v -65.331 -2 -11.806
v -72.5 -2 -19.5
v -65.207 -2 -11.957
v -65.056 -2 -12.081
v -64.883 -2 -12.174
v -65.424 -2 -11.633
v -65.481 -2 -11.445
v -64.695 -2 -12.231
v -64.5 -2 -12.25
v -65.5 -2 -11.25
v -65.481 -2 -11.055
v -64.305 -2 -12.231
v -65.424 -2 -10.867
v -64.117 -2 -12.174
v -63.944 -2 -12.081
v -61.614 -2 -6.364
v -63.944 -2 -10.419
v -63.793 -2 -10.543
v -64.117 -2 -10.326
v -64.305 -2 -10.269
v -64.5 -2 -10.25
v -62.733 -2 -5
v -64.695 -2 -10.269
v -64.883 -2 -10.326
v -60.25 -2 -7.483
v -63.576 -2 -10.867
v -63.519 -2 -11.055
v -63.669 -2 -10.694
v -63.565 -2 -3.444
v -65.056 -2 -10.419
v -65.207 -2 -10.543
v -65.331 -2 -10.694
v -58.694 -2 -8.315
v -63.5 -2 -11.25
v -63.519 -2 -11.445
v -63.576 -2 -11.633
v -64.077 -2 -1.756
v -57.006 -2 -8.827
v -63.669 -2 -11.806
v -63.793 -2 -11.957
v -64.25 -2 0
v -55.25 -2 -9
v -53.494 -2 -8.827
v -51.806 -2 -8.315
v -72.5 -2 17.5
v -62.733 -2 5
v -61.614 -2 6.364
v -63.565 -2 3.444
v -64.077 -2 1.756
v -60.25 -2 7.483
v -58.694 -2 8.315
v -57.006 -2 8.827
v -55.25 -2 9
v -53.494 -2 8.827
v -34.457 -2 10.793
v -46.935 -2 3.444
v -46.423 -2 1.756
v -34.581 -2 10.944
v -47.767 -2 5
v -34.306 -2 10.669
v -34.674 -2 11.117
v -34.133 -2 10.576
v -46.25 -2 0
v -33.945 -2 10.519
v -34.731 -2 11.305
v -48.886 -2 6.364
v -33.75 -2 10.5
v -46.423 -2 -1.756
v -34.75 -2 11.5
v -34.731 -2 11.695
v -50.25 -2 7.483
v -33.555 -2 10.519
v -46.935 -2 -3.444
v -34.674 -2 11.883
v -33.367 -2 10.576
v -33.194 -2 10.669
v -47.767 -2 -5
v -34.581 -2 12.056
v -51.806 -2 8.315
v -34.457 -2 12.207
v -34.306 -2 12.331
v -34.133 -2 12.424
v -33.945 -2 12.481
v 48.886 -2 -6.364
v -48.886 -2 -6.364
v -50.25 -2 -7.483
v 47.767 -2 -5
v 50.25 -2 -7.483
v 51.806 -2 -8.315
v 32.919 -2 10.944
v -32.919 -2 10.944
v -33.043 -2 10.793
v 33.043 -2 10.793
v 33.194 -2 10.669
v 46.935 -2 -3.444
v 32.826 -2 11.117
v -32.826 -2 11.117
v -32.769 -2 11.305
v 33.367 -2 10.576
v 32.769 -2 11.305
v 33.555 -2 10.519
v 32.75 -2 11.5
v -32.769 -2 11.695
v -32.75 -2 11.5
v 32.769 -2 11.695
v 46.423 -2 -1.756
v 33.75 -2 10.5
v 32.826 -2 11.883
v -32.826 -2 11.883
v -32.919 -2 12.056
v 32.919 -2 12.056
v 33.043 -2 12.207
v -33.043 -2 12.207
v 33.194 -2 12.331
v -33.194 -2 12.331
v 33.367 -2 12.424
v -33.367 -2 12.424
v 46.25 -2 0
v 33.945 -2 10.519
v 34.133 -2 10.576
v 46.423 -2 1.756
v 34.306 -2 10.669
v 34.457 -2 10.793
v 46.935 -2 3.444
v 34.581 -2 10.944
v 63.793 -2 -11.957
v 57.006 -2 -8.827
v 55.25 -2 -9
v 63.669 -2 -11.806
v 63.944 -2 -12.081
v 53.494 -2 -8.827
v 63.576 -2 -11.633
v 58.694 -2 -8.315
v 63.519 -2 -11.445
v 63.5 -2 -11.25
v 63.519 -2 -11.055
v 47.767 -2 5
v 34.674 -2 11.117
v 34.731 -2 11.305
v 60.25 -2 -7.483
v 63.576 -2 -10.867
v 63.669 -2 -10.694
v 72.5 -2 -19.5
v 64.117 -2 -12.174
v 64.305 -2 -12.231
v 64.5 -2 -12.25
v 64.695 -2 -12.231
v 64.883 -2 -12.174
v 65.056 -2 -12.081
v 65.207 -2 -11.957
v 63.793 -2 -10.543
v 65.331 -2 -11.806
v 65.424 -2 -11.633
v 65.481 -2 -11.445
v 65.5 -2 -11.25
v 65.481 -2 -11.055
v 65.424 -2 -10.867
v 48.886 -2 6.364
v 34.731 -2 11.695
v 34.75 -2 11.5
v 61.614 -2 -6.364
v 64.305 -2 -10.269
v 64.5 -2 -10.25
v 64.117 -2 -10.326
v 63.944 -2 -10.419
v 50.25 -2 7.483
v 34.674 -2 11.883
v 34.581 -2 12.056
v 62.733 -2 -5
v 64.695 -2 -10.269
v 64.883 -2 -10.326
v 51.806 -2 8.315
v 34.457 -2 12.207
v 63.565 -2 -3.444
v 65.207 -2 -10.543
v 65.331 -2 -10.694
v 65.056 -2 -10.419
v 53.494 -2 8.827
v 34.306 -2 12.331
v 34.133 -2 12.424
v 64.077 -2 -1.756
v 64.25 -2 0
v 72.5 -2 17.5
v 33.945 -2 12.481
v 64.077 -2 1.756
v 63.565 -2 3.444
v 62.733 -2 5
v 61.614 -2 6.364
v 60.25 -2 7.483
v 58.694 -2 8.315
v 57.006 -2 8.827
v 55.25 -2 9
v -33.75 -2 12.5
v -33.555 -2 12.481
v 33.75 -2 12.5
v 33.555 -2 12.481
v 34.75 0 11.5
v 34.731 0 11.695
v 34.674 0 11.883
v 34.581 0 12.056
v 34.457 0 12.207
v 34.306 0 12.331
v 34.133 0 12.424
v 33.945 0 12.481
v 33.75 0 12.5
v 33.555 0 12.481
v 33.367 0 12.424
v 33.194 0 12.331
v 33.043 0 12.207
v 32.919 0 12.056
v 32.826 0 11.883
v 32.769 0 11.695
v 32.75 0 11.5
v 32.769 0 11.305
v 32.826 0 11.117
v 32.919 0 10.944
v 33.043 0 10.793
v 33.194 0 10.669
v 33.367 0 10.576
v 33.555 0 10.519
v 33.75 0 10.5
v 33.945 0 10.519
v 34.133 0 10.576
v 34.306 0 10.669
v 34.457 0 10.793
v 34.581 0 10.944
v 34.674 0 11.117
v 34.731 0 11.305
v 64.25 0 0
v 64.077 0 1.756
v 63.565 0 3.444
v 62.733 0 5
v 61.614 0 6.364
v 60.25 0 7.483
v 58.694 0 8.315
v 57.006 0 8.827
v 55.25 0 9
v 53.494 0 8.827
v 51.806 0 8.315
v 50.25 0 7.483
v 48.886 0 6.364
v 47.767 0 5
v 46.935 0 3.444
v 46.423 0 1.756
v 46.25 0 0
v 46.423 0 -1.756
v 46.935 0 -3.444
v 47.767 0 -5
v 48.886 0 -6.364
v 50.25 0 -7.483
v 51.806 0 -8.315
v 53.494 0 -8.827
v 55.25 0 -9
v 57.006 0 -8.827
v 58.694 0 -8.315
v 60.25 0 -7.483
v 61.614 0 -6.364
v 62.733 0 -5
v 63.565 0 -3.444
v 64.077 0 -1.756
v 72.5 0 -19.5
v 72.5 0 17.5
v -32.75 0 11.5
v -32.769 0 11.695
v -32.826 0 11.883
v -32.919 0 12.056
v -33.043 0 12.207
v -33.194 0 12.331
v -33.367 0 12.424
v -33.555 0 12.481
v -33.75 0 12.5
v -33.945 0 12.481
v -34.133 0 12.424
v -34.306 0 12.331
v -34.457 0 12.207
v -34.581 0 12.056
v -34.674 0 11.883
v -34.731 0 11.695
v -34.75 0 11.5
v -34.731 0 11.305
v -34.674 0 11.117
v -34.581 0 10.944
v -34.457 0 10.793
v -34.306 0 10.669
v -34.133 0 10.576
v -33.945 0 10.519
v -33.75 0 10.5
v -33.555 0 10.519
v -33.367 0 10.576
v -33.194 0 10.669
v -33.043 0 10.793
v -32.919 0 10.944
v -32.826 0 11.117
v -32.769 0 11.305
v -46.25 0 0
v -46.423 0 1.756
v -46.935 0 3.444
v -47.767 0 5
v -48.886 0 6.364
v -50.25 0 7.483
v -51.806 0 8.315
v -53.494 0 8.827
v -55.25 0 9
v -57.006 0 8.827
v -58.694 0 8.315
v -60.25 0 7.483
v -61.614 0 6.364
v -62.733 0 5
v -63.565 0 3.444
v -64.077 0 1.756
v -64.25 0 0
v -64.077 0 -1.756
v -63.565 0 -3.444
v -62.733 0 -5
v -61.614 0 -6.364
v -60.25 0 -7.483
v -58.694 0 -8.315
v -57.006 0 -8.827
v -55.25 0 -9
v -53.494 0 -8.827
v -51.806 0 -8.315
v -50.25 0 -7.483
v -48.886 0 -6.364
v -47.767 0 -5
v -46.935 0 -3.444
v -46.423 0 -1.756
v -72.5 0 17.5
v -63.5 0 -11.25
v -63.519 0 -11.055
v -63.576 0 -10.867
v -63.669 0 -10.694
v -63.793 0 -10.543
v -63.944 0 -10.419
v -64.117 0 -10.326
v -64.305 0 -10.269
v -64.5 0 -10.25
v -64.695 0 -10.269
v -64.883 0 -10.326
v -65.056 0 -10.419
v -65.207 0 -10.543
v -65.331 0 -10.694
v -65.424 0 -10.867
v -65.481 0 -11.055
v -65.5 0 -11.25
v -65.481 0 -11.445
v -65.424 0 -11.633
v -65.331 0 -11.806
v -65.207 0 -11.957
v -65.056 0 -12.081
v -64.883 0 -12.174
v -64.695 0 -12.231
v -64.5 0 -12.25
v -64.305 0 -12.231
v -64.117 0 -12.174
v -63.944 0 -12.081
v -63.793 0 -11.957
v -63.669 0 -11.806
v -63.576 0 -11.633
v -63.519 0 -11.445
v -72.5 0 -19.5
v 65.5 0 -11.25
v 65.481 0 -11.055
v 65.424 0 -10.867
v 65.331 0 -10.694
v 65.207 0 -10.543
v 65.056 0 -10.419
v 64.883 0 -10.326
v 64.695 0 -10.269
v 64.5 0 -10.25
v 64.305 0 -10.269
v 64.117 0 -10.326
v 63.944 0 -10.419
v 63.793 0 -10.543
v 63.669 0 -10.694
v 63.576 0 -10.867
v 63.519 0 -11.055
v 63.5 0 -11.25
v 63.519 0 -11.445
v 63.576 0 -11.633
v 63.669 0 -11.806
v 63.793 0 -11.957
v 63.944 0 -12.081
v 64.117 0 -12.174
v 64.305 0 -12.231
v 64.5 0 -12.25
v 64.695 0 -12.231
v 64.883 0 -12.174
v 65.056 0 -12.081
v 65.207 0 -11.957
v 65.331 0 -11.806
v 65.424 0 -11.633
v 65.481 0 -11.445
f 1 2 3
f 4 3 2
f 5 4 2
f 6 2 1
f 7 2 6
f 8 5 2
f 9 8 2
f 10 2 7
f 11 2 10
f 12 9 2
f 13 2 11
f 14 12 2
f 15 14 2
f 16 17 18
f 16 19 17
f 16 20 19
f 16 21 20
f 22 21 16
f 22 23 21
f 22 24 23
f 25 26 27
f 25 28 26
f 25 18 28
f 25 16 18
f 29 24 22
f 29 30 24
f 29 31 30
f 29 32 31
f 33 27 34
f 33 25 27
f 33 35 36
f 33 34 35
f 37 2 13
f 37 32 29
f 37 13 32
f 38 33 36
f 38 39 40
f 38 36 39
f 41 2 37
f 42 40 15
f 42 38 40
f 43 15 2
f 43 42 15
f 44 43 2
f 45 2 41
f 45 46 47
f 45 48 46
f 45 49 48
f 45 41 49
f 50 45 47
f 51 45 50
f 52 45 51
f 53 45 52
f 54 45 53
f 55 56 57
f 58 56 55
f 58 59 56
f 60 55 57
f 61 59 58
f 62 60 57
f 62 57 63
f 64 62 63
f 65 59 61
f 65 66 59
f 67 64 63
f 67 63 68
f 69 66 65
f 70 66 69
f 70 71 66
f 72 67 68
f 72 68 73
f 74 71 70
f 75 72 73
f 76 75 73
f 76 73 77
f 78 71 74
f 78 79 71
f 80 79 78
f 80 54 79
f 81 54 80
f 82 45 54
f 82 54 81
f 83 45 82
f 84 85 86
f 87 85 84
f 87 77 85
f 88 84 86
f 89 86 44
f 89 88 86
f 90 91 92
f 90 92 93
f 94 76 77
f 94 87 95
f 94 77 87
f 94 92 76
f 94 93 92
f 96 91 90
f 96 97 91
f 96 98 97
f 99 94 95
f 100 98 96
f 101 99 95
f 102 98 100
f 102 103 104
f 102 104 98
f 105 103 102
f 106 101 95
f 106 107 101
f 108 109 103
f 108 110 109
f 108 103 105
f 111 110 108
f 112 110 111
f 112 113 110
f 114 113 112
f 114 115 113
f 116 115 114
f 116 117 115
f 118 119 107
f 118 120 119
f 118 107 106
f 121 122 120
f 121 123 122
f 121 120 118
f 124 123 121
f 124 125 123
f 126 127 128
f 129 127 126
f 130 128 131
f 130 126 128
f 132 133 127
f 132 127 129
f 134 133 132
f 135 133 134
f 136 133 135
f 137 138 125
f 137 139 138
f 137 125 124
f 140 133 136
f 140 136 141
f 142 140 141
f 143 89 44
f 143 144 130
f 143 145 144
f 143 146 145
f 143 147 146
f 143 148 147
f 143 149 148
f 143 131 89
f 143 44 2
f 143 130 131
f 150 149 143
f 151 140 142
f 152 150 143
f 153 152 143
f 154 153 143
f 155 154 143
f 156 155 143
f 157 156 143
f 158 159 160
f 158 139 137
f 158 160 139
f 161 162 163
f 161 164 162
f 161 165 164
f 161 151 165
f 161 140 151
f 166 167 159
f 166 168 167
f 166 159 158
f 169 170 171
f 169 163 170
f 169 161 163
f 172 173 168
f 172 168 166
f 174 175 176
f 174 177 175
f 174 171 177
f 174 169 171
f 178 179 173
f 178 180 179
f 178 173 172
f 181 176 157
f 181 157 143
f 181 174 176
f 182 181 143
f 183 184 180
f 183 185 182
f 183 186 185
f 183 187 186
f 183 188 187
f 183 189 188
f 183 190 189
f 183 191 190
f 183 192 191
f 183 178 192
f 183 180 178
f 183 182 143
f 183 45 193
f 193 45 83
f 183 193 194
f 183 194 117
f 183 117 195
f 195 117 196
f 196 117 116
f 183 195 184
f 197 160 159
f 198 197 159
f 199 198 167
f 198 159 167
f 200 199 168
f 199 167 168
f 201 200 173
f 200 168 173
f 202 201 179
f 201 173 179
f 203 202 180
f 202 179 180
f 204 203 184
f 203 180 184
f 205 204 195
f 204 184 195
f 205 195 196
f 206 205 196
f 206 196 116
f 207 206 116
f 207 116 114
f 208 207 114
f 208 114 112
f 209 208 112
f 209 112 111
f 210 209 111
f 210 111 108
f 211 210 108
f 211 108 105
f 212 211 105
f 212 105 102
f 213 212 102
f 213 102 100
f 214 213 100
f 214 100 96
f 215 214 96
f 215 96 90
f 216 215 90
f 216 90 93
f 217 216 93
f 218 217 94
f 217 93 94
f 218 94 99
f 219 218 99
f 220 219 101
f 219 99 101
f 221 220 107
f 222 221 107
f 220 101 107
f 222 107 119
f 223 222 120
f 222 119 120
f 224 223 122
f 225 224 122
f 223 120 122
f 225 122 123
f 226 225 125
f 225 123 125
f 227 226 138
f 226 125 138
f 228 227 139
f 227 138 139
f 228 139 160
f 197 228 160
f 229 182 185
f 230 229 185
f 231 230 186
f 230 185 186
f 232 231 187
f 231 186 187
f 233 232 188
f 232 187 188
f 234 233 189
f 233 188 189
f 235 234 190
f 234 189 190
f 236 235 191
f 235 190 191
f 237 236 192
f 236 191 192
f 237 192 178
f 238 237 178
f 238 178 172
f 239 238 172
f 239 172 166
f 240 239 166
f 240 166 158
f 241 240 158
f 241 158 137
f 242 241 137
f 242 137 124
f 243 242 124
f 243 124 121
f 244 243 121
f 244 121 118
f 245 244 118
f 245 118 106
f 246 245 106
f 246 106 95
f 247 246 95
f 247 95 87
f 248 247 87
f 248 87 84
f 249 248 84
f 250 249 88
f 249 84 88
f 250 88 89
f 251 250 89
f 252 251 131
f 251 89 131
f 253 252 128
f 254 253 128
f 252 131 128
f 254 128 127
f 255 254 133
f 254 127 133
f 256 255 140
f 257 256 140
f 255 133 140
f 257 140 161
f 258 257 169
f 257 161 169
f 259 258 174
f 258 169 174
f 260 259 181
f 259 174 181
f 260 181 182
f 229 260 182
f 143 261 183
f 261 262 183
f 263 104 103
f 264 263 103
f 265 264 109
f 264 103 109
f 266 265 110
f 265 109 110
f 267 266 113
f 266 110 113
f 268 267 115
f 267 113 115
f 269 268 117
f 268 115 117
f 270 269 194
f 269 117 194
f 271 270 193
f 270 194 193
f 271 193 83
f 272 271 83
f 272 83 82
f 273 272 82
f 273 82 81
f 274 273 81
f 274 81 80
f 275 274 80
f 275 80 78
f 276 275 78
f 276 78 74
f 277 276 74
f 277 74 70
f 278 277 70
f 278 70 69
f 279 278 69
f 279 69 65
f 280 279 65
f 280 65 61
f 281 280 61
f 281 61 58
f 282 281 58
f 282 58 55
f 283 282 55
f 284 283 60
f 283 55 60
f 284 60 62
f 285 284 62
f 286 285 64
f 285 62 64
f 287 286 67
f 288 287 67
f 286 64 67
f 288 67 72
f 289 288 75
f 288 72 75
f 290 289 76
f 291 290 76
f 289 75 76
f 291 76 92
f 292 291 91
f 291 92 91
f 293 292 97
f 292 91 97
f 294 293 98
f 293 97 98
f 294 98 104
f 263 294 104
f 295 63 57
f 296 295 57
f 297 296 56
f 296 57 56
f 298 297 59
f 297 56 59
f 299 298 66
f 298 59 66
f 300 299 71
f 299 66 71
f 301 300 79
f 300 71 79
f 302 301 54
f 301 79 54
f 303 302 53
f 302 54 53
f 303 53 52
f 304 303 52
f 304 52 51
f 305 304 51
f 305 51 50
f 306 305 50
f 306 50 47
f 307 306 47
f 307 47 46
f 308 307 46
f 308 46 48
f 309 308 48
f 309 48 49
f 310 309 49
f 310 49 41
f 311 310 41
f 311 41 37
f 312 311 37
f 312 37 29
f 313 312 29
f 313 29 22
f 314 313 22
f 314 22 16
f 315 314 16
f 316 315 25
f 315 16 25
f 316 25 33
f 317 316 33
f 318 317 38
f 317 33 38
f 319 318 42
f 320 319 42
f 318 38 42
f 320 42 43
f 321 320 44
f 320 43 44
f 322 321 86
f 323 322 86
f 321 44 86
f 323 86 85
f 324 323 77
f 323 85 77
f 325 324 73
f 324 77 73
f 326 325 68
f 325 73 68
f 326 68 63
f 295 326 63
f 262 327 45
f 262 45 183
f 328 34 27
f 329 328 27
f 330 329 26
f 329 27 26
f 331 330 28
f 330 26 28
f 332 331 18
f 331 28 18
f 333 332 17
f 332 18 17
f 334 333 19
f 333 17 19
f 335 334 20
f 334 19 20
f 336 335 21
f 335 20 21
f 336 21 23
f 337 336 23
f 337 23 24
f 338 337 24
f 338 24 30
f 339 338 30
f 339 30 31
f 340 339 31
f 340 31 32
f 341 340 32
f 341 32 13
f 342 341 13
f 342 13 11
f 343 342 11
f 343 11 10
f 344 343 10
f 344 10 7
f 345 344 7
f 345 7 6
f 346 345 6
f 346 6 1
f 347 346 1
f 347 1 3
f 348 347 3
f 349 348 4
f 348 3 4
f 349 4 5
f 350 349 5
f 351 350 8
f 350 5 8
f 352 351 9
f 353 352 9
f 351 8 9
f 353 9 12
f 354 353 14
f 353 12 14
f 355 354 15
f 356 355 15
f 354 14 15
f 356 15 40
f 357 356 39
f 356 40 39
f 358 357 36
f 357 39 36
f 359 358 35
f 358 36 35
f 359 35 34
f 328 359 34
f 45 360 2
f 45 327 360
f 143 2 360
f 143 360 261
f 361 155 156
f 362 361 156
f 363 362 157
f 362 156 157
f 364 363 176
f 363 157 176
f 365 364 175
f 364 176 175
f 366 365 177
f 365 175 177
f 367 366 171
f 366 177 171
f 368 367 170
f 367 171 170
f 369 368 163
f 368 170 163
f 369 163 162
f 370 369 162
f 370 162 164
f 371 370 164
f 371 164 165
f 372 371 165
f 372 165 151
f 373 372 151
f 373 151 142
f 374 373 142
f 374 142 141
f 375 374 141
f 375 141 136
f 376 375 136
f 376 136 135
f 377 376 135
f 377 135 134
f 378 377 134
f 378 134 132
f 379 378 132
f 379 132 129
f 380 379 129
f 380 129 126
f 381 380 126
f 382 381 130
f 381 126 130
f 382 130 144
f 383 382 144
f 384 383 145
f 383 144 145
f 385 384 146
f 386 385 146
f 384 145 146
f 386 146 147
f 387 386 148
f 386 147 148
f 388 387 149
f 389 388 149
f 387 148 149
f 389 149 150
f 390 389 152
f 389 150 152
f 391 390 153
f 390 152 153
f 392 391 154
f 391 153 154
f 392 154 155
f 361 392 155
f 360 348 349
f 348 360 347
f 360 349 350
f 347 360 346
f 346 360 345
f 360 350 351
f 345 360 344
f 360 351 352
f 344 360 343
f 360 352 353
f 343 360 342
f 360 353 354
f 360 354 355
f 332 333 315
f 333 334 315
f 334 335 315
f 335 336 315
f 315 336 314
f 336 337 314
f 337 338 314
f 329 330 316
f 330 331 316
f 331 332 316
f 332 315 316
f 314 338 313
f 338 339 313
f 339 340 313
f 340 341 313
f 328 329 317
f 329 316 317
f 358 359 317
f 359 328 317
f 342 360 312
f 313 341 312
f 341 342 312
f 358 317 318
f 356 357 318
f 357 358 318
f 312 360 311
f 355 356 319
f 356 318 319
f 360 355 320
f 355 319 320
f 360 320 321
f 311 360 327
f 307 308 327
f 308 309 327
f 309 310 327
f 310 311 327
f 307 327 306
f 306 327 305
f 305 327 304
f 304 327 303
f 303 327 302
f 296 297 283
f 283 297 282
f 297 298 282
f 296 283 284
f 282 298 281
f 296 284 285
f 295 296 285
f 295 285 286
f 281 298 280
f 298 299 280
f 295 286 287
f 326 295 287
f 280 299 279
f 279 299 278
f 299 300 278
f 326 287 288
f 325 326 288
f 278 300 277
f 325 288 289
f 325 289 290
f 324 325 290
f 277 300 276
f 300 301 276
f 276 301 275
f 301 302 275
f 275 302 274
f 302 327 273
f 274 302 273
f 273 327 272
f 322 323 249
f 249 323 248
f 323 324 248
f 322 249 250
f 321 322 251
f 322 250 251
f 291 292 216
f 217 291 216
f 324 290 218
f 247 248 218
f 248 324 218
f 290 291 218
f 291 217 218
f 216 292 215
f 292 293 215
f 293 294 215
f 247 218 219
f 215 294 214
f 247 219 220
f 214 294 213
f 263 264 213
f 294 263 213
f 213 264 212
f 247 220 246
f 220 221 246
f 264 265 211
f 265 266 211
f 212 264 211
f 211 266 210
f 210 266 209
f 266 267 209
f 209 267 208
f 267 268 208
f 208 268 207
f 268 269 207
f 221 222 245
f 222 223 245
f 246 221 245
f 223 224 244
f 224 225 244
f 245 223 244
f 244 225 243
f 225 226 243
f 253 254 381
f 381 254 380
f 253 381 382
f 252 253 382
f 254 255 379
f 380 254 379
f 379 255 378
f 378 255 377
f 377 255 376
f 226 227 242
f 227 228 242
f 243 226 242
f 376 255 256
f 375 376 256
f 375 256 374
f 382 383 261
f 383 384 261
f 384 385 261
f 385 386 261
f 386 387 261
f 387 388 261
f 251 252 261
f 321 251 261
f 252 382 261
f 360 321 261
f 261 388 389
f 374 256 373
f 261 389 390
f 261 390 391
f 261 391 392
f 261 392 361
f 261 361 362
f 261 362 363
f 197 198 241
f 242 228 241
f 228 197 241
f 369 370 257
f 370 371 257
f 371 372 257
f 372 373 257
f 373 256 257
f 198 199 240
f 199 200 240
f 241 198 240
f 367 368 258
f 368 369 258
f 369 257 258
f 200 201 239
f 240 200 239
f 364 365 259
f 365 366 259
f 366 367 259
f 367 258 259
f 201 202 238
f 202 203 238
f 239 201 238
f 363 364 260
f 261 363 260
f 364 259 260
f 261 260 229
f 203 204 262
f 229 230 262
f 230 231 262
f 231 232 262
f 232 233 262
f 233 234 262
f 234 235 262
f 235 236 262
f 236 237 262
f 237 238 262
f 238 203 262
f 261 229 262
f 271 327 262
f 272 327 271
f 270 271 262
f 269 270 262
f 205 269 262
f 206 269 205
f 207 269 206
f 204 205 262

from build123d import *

# Parameters (mm, degrees)
F0_W     = 145
F0_H     = 35
F1_DEPTH = 2
F2_R     = 1
F3_DEPTH = 25
F4_R     = 1
F5_DEPTH = 25
F6_R     = 9
F7_DEPTH = 25
F8_W     = 145
F8_H     = 2
F9_DEPTH = 2


with BuildPart() as f1:
    # F0 (on Front) → F1 (new body)
    with BuildSketch(Plane.XZ):
        Rectangle(F0_W, F0_H)
    extrude(amount=F1_DEPTH)

    # F2 (on face) → F3 (cut)
    with BuildSketch(Plane.XZ.offset(2)):
        with Locations((-33.75, 11.5)):
            Circle(F2_R)
        with Locations((33.75, 11.5)):
            Circle(F2_R)
    extrude(amount=-F3_DEPTH, mode=Mode.SUBTRACT)

    # F4 (on face) → F5 (cut)
    with BuildSketch(Plane.XZ.offset(2)):
        with Locations((-64.5, -11.25)):
            Circle(F4_R)
        with Locations((64.5, -11.25)):
            Circle(F4_R)
    extrude(amount=-F5_DEPTH, mode=Mode.SUBTRACT)

    # F6 (on face) → F7 (cut)
    with BuildSketch(Plane.XZ.offset(2)):
        with Locations((-55.25, 0)):
            Circle(F6_R)
        with Locations((55.25, 0)):
            Circle(F6_R)
    extrude(amount=-F7_DEPTH, mode=Mode.SUBTRACT)

    # F8 (on face) → F9 (join)
    with BuildSketch(Plane(origin=(0, 0, -17.5), x_dir=(1, 0, 0), z_dir=(0, 0, -1))):
        with Locations((0, 1)):
            Rectangle(F8_W, F8_H)
    extrude(amount=F9_DEPTH)


solid = f1.part
